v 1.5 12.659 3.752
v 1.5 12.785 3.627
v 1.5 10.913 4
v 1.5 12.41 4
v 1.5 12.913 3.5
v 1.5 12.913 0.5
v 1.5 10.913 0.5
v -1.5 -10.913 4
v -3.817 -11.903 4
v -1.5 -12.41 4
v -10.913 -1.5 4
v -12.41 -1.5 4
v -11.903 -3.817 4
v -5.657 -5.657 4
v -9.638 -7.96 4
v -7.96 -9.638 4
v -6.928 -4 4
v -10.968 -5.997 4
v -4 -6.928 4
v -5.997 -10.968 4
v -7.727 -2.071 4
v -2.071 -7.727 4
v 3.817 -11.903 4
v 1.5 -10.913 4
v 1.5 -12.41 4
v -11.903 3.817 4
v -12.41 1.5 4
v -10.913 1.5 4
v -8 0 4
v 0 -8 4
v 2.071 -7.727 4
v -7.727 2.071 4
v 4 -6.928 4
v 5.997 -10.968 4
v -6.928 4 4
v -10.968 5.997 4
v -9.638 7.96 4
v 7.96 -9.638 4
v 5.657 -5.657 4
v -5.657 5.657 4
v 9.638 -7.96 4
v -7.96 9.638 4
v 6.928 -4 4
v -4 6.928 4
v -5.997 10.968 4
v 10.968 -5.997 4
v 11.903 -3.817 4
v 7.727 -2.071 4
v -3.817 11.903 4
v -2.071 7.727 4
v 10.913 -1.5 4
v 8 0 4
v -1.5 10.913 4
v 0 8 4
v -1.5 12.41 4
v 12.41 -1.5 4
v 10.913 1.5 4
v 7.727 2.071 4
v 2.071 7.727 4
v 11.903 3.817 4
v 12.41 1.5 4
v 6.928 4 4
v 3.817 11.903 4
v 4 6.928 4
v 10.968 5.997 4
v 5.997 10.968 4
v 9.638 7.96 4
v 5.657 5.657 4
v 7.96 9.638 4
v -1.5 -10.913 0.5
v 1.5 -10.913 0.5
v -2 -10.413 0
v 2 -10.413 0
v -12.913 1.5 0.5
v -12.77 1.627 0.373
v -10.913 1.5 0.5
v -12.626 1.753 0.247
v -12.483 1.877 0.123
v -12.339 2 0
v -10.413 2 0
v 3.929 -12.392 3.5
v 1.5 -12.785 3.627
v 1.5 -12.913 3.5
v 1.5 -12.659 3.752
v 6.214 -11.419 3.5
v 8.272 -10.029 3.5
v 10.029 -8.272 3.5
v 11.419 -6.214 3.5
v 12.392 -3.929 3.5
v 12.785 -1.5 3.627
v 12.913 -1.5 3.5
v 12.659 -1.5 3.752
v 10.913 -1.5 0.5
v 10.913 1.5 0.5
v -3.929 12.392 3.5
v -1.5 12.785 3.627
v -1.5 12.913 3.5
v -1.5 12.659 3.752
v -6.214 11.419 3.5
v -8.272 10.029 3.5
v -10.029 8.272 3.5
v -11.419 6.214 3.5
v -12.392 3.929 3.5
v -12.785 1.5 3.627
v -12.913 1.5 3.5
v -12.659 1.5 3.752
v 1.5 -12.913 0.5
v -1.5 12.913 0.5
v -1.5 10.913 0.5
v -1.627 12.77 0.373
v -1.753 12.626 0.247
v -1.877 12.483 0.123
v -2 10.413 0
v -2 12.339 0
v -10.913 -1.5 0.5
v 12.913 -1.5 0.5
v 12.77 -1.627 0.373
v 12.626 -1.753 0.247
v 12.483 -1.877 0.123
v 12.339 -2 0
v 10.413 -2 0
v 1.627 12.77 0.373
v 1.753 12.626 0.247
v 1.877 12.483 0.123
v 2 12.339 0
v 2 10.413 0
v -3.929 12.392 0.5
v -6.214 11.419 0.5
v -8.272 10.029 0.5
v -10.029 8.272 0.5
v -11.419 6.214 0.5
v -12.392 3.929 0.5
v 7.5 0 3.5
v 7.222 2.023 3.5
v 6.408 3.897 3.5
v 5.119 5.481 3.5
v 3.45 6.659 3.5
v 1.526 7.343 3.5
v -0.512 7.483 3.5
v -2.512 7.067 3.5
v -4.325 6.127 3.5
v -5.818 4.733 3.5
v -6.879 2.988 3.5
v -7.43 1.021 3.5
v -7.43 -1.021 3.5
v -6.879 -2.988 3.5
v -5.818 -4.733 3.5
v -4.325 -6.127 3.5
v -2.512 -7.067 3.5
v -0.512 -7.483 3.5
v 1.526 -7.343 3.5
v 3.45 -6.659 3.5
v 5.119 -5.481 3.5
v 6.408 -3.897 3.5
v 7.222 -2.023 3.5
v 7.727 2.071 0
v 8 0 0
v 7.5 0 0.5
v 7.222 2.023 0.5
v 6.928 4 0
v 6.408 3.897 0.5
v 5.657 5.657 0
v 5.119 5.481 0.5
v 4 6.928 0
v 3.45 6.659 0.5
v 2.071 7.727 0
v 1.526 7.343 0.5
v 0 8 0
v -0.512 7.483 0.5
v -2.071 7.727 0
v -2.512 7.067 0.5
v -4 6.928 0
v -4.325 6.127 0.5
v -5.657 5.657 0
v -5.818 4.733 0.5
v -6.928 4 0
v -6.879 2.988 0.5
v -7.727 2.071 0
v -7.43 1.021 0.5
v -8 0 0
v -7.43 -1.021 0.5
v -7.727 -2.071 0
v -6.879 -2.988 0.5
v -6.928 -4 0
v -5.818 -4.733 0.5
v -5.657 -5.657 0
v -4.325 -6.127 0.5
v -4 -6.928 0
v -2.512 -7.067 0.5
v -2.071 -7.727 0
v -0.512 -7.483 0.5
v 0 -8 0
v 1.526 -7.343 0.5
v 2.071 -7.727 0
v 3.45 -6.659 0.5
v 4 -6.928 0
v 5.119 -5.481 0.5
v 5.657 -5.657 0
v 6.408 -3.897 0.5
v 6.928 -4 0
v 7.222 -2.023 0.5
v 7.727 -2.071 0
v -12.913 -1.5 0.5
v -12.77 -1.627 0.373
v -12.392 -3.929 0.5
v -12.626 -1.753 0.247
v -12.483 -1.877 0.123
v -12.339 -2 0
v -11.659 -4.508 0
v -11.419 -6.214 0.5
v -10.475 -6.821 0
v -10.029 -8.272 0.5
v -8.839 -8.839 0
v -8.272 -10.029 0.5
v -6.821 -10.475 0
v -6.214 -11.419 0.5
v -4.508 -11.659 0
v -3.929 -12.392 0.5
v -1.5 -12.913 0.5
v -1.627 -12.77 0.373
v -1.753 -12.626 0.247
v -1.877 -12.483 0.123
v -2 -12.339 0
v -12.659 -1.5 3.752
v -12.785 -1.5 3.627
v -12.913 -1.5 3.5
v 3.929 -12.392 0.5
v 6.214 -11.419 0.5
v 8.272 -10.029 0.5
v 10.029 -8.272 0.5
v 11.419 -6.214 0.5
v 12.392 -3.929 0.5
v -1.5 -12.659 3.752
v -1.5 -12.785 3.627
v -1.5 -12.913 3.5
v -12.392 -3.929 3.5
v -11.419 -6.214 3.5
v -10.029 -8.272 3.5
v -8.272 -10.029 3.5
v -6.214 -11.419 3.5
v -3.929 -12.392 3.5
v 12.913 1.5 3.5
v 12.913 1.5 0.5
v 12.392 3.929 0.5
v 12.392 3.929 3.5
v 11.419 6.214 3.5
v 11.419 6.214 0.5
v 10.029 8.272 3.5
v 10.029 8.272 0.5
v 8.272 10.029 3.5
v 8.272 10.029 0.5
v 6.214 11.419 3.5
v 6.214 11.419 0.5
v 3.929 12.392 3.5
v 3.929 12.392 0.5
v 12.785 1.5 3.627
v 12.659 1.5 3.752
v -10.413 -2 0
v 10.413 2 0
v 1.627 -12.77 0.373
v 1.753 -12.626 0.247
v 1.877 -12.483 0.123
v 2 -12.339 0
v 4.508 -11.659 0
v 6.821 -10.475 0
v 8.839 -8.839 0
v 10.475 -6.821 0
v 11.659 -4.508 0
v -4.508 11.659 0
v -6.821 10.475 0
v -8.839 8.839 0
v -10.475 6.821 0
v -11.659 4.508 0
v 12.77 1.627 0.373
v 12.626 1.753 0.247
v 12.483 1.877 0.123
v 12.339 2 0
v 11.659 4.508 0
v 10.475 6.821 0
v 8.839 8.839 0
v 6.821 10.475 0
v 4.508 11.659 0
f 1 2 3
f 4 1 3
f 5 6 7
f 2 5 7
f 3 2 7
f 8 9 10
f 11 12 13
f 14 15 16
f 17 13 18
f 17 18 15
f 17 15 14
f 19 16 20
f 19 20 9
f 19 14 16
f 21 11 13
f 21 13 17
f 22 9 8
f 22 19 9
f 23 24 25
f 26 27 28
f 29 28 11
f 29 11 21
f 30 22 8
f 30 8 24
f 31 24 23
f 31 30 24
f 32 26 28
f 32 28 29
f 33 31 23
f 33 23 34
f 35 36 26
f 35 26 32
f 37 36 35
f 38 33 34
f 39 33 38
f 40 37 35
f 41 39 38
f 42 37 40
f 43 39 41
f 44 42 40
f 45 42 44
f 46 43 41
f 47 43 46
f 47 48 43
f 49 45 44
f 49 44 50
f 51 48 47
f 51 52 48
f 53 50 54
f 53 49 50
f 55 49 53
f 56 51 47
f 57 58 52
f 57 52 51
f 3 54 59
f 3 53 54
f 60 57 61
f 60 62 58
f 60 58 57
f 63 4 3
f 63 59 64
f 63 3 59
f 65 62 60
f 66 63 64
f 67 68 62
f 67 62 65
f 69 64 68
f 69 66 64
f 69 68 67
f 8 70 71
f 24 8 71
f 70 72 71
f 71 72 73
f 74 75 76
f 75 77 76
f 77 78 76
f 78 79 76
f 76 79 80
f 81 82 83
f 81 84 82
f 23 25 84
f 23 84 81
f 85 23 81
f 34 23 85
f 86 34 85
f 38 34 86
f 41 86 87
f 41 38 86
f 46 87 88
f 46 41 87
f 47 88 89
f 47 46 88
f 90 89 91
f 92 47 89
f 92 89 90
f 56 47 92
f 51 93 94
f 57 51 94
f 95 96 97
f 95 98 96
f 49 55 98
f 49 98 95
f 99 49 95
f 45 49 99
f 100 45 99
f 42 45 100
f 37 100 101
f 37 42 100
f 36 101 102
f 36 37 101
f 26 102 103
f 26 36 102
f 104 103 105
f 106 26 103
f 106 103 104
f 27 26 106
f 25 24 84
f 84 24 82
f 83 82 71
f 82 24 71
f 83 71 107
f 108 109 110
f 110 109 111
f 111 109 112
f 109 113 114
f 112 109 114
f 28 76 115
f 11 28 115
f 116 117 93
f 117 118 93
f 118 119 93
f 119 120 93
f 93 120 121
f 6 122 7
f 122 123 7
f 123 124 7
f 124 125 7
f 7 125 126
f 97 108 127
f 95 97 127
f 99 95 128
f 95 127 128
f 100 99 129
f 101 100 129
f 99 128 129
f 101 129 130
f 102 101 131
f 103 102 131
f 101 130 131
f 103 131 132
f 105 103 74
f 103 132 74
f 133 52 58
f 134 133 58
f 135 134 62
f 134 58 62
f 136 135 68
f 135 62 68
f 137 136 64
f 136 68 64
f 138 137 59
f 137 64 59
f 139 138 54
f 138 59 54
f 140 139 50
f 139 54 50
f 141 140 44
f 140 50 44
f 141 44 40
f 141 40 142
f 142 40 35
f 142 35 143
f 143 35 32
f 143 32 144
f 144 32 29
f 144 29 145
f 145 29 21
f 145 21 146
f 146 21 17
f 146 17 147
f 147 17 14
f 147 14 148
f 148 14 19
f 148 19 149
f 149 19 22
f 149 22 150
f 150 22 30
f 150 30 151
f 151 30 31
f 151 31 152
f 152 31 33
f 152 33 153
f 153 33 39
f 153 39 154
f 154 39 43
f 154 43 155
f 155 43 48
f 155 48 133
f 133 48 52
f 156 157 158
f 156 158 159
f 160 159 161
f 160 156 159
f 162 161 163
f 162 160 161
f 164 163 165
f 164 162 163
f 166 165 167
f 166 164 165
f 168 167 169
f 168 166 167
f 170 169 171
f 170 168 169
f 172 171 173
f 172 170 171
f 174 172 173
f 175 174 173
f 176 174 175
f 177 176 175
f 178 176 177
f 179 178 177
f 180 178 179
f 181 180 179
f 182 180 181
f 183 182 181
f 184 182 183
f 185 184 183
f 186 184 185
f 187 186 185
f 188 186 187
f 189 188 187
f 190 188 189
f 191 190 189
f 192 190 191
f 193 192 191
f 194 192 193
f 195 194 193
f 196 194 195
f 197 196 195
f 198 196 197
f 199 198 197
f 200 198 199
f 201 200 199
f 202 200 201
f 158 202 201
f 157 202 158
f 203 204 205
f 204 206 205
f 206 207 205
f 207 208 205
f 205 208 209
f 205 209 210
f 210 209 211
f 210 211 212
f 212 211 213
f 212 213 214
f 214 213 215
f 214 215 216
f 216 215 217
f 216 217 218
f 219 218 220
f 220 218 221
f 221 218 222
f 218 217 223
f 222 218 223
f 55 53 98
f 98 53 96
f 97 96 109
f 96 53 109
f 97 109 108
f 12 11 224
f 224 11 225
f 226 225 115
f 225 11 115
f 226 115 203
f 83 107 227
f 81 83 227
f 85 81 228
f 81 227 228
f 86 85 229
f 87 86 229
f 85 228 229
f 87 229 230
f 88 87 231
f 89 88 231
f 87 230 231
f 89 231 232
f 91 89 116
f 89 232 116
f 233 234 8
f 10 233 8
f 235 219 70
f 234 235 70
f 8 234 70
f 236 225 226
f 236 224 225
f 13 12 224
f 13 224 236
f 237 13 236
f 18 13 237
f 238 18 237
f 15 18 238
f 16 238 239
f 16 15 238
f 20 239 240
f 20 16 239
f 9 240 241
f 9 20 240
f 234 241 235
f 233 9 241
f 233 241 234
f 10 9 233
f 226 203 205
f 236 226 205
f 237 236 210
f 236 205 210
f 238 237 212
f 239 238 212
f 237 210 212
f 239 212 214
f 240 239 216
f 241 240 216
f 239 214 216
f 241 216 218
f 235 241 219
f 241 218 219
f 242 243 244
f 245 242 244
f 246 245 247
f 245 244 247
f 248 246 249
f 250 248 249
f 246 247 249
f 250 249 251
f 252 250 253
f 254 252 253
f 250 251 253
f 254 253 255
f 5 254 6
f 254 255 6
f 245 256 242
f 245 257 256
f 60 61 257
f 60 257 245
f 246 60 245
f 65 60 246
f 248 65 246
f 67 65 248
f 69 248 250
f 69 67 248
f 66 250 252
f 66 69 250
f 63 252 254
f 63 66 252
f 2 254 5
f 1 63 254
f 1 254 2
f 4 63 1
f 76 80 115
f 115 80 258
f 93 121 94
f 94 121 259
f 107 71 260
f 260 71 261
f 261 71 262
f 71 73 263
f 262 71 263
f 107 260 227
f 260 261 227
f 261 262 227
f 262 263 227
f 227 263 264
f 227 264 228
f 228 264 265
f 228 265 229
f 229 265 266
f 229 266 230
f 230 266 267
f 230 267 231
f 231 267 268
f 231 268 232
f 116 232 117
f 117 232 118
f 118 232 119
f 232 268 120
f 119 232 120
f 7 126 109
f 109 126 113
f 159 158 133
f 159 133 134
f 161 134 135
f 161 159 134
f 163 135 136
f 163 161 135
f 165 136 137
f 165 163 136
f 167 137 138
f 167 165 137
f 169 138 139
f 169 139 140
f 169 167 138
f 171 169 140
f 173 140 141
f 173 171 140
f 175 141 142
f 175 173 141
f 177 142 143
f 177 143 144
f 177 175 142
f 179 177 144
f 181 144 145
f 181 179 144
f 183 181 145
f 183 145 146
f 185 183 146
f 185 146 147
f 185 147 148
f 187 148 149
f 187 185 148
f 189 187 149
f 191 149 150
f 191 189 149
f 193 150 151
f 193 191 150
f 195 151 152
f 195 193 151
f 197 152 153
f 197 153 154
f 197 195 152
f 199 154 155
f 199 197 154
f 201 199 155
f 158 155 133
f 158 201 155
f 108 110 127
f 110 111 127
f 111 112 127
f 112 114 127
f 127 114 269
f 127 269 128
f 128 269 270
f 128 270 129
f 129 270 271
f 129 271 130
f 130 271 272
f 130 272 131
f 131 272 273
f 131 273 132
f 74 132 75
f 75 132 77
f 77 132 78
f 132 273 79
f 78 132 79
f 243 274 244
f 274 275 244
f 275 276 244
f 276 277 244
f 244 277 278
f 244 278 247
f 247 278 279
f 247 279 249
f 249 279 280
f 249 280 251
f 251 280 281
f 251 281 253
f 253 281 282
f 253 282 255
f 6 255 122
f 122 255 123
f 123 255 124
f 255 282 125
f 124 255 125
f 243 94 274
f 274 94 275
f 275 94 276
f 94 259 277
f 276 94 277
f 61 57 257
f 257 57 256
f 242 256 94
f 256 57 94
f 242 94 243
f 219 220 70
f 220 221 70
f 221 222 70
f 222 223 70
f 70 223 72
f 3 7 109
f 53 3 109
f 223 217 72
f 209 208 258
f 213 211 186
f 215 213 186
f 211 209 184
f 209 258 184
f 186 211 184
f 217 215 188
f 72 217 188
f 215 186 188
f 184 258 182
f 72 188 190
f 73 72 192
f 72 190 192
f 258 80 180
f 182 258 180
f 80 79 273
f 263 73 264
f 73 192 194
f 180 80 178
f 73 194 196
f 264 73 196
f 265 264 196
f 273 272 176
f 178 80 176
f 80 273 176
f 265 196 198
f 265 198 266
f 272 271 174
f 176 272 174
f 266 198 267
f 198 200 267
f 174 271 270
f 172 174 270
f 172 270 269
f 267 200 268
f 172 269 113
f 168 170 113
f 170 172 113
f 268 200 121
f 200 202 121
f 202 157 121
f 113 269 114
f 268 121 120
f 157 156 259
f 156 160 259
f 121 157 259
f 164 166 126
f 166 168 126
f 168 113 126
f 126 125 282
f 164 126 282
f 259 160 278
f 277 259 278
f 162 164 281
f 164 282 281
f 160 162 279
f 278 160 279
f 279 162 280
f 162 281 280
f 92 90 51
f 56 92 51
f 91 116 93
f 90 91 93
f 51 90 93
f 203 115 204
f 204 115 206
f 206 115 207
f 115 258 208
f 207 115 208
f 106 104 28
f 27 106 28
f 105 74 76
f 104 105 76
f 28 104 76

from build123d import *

# Parameters (mm, degrees)
SKETCH_1_R      = 7.5
EXTRUDE_1_DEPTH = 4
CHAMFER_1_SIZE  = 0.5


with BuildPart() as part:
    # Эскиз1 → Бобышка-Вытянуть1 (new body)
    with BuildSketch(Plane.XY):
        with BuildLine():
            Line((1.5, 12.91317157), (1.5, 10.91317157))
            Line((1.5, 10.91317157), (-1.5, 10.91317157))
            Line((-1.5, 10.91317157), (-1.5, 12.91317157))
            ThreePointArc((-1.5, 12.91317157), (-9.192388155, 9.192388155), (-12.91317157, 1.5))
            Line((-12.91317157, 1.5), (-10.91317157, 1.5))
            Line((-10.91317157, 1.5), (-10.91317157, -1.5))
            Line((-10.91317157, -1.5), (-12.91317157, -1.5))
            ThreePointArc((-12.91317157, -1.5), (-9.192388155, -9.192388155), (-1.5, -12.91317157))
            Line((-1.5, -12.91317157), (-1.5, -10.91317157))
            Line((-1.5, -10.91317157), (1.5, -10.91317157))
            Line((1.5, -10.91317157), (1.5, -12.91317157))
            ThreePointArc((1.5, -12.91317157), (9.192388155, -9.192388155), (12.91317157, -1.5))
            Line((12.91317157, -1.5), (10.91317157, -1.5))
            Line((10.91317157, -1.5), (10.91317157, 1.5))
            Line((10.91317157, 1.5), (12.91317157, 1.5))
            ThreePointArc((12.91317157, 1.5), (9.192388155, 9.192388155), (1.5, 12.91317157))
        make_face()
        Circle(SKETCH_1_R, mode=Mode.SUBTRACT)
    extrude(amount=EXTRUDE_1_DEPTH)

    # Фаска1
    chamfer_1_edges = [part.edges().sort_by_distance(p)[0] for p in [
        (-1.5, 11.91317157, 0),
        (0, 10.91317157, 0),
        (1.5, 11.91317157, 0),
        (9.192388155, 9.192388155, 0),
        (11.91317157, 1.5, 0),
        (-9.192388155, -9.192388155, 4),
        (10.91317157, 0, 0),
        (11.91317157, -1.5, 0),
        (9.192388155, -9.192388155, 0),
        (1.5, -11.91317157, 0),
        (0, -10.91317157, 0),
        (-1.5, -11.91317157, 0),
        (-9.192388155, -9.192388155, 0),
        (-11.91317157, -1.5, 0),
        (-10.91317157, 0, 0),
        (-11.91317157, 1.5, 0),
        (-9.192388155, 9.192388155, 0),
        (9.192388155, -9.192388155, 4),
        (-7.5, 0, 0),
        (-7.5, 0, 4),
        (-9.192388155, 9.192388155, 4),
        (9.192388155, 9.192388155, 4),
    ]]
    chamfer(chamfer_1_edges, length=CHAMFER_1_SIZE)


solid = part.part
